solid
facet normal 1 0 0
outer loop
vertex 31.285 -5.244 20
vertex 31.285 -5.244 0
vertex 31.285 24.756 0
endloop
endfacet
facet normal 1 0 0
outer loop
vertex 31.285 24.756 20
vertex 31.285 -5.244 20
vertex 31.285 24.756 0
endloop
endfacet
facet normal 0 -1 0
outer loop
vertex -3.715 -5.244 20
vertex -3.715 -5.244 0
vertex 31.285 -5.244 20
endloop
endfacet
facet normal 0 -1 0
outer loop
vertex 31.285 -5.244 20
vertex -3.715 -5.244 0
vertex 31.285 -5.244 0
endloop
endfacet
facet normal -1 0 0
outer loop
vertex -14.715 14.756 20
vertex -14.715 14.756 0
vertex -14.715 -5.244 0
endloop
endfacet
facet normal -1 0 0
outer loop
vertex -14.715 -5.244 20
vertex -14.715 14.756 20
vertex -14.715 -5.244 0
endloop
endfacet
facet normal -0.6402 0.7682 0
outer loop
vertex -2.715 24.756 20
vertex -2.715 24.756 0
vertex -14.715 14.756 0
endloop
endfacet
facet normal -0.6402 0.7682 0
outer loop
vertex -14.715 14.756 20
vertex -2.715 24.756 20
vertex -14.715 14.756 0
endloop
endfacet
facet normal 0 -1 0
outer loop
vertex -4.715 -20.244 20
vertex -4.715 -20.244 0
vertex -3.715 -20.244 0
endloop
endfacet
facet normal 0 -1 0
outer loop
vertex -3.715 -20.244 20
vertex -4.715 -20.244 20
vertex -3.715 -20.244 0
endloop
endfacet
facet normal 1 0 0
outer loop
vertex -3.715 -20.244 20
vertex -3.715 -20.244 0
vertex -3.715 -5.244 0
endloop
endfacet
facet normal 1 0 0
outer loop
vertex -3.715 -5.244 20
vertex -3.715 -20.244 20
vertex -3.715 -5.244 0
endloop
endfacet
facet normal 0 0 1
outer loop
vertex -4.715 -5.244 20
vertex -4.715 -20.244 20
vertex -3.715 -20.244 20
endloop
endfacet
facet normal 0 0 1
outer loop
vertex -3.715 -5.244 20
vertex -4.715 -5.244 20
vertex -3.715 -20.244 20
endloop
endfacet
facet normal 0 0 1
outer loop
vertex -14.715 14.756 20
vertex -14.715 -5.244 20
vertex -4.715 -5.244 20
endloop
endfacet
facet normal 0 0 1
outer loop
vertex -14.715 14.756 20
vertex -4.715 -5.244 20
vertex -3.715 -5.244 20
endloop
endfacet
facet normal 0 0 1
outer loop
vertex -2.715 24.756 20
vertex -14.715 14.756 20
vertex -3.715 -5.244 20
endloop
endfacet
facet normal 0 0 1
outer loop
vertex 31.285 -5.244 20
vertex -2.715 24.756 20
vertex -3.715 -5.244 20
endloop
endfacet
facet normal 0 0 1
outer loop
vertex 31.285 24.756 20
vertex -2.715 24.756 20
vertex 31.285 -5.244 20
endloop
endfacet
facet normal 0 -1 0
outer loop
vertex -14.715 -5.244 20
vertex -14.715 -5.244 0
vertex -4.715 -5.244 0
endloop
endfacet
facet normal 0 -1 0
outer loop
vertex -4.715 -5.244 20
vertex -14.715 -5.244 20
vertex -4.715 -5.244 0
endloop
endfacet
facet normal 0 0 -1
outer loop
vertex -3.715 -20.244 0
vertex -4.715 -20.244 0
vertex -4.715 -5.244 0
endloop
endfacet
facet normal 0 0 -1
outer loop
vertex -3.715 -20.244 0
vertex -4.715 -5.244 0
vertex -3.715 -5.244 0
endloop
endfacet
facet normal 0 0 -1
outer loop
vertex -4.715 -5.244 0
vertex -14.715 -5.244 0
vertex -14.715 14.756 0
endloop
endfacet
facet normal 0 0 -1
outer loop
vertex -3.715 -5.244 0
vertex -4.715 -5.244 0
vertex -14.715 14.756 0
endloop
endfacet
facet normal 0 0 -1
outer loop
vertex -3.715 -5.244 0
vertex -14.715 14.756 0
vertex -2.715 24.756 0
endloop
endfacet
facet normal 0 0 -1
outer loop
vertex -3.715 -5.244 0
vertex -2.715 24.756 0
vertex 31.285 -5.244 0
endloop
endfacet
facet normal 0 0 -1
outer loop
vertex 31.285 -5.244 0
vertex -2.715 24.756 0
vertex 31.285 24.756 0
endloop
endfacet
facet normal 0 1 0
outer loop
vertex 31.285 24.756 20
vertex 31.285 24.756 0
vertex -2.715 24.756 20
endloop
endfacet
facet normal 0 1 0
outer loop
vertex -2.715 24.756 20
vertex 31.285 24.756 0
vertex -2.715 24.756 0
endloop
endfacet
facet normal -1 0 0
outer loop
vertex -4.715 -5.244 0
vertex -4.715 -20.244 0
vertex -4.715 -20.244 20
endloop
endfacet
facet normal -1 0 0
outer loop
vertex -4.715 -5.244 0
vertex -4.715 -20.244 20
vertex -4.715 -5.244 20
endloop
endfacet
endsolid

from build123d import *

# Parameters (mm, degrees)
F0_W     = 1
F0_H     = 15
F1_DEPTH = 20


with BuildPart() as f1:
    # F0 (on Top) → F1 (new body)
    with BuildSketch(Plane.XY):
        Polygon((31.285321, 24.755745), (-2.714679, 24.755745), (-14.714679, 14.755745), (-14.714679, -5.244255), (-4.714679, -5.244255), (-3.714679, -5.244255), (31.285321, -5.244255), align=None)
        with Locations((-4.214679, -12.744255)):
            Rectangle(F0_W, F0_H)
    extrude(amount=F1_DEPTH)


solid = f1.part
